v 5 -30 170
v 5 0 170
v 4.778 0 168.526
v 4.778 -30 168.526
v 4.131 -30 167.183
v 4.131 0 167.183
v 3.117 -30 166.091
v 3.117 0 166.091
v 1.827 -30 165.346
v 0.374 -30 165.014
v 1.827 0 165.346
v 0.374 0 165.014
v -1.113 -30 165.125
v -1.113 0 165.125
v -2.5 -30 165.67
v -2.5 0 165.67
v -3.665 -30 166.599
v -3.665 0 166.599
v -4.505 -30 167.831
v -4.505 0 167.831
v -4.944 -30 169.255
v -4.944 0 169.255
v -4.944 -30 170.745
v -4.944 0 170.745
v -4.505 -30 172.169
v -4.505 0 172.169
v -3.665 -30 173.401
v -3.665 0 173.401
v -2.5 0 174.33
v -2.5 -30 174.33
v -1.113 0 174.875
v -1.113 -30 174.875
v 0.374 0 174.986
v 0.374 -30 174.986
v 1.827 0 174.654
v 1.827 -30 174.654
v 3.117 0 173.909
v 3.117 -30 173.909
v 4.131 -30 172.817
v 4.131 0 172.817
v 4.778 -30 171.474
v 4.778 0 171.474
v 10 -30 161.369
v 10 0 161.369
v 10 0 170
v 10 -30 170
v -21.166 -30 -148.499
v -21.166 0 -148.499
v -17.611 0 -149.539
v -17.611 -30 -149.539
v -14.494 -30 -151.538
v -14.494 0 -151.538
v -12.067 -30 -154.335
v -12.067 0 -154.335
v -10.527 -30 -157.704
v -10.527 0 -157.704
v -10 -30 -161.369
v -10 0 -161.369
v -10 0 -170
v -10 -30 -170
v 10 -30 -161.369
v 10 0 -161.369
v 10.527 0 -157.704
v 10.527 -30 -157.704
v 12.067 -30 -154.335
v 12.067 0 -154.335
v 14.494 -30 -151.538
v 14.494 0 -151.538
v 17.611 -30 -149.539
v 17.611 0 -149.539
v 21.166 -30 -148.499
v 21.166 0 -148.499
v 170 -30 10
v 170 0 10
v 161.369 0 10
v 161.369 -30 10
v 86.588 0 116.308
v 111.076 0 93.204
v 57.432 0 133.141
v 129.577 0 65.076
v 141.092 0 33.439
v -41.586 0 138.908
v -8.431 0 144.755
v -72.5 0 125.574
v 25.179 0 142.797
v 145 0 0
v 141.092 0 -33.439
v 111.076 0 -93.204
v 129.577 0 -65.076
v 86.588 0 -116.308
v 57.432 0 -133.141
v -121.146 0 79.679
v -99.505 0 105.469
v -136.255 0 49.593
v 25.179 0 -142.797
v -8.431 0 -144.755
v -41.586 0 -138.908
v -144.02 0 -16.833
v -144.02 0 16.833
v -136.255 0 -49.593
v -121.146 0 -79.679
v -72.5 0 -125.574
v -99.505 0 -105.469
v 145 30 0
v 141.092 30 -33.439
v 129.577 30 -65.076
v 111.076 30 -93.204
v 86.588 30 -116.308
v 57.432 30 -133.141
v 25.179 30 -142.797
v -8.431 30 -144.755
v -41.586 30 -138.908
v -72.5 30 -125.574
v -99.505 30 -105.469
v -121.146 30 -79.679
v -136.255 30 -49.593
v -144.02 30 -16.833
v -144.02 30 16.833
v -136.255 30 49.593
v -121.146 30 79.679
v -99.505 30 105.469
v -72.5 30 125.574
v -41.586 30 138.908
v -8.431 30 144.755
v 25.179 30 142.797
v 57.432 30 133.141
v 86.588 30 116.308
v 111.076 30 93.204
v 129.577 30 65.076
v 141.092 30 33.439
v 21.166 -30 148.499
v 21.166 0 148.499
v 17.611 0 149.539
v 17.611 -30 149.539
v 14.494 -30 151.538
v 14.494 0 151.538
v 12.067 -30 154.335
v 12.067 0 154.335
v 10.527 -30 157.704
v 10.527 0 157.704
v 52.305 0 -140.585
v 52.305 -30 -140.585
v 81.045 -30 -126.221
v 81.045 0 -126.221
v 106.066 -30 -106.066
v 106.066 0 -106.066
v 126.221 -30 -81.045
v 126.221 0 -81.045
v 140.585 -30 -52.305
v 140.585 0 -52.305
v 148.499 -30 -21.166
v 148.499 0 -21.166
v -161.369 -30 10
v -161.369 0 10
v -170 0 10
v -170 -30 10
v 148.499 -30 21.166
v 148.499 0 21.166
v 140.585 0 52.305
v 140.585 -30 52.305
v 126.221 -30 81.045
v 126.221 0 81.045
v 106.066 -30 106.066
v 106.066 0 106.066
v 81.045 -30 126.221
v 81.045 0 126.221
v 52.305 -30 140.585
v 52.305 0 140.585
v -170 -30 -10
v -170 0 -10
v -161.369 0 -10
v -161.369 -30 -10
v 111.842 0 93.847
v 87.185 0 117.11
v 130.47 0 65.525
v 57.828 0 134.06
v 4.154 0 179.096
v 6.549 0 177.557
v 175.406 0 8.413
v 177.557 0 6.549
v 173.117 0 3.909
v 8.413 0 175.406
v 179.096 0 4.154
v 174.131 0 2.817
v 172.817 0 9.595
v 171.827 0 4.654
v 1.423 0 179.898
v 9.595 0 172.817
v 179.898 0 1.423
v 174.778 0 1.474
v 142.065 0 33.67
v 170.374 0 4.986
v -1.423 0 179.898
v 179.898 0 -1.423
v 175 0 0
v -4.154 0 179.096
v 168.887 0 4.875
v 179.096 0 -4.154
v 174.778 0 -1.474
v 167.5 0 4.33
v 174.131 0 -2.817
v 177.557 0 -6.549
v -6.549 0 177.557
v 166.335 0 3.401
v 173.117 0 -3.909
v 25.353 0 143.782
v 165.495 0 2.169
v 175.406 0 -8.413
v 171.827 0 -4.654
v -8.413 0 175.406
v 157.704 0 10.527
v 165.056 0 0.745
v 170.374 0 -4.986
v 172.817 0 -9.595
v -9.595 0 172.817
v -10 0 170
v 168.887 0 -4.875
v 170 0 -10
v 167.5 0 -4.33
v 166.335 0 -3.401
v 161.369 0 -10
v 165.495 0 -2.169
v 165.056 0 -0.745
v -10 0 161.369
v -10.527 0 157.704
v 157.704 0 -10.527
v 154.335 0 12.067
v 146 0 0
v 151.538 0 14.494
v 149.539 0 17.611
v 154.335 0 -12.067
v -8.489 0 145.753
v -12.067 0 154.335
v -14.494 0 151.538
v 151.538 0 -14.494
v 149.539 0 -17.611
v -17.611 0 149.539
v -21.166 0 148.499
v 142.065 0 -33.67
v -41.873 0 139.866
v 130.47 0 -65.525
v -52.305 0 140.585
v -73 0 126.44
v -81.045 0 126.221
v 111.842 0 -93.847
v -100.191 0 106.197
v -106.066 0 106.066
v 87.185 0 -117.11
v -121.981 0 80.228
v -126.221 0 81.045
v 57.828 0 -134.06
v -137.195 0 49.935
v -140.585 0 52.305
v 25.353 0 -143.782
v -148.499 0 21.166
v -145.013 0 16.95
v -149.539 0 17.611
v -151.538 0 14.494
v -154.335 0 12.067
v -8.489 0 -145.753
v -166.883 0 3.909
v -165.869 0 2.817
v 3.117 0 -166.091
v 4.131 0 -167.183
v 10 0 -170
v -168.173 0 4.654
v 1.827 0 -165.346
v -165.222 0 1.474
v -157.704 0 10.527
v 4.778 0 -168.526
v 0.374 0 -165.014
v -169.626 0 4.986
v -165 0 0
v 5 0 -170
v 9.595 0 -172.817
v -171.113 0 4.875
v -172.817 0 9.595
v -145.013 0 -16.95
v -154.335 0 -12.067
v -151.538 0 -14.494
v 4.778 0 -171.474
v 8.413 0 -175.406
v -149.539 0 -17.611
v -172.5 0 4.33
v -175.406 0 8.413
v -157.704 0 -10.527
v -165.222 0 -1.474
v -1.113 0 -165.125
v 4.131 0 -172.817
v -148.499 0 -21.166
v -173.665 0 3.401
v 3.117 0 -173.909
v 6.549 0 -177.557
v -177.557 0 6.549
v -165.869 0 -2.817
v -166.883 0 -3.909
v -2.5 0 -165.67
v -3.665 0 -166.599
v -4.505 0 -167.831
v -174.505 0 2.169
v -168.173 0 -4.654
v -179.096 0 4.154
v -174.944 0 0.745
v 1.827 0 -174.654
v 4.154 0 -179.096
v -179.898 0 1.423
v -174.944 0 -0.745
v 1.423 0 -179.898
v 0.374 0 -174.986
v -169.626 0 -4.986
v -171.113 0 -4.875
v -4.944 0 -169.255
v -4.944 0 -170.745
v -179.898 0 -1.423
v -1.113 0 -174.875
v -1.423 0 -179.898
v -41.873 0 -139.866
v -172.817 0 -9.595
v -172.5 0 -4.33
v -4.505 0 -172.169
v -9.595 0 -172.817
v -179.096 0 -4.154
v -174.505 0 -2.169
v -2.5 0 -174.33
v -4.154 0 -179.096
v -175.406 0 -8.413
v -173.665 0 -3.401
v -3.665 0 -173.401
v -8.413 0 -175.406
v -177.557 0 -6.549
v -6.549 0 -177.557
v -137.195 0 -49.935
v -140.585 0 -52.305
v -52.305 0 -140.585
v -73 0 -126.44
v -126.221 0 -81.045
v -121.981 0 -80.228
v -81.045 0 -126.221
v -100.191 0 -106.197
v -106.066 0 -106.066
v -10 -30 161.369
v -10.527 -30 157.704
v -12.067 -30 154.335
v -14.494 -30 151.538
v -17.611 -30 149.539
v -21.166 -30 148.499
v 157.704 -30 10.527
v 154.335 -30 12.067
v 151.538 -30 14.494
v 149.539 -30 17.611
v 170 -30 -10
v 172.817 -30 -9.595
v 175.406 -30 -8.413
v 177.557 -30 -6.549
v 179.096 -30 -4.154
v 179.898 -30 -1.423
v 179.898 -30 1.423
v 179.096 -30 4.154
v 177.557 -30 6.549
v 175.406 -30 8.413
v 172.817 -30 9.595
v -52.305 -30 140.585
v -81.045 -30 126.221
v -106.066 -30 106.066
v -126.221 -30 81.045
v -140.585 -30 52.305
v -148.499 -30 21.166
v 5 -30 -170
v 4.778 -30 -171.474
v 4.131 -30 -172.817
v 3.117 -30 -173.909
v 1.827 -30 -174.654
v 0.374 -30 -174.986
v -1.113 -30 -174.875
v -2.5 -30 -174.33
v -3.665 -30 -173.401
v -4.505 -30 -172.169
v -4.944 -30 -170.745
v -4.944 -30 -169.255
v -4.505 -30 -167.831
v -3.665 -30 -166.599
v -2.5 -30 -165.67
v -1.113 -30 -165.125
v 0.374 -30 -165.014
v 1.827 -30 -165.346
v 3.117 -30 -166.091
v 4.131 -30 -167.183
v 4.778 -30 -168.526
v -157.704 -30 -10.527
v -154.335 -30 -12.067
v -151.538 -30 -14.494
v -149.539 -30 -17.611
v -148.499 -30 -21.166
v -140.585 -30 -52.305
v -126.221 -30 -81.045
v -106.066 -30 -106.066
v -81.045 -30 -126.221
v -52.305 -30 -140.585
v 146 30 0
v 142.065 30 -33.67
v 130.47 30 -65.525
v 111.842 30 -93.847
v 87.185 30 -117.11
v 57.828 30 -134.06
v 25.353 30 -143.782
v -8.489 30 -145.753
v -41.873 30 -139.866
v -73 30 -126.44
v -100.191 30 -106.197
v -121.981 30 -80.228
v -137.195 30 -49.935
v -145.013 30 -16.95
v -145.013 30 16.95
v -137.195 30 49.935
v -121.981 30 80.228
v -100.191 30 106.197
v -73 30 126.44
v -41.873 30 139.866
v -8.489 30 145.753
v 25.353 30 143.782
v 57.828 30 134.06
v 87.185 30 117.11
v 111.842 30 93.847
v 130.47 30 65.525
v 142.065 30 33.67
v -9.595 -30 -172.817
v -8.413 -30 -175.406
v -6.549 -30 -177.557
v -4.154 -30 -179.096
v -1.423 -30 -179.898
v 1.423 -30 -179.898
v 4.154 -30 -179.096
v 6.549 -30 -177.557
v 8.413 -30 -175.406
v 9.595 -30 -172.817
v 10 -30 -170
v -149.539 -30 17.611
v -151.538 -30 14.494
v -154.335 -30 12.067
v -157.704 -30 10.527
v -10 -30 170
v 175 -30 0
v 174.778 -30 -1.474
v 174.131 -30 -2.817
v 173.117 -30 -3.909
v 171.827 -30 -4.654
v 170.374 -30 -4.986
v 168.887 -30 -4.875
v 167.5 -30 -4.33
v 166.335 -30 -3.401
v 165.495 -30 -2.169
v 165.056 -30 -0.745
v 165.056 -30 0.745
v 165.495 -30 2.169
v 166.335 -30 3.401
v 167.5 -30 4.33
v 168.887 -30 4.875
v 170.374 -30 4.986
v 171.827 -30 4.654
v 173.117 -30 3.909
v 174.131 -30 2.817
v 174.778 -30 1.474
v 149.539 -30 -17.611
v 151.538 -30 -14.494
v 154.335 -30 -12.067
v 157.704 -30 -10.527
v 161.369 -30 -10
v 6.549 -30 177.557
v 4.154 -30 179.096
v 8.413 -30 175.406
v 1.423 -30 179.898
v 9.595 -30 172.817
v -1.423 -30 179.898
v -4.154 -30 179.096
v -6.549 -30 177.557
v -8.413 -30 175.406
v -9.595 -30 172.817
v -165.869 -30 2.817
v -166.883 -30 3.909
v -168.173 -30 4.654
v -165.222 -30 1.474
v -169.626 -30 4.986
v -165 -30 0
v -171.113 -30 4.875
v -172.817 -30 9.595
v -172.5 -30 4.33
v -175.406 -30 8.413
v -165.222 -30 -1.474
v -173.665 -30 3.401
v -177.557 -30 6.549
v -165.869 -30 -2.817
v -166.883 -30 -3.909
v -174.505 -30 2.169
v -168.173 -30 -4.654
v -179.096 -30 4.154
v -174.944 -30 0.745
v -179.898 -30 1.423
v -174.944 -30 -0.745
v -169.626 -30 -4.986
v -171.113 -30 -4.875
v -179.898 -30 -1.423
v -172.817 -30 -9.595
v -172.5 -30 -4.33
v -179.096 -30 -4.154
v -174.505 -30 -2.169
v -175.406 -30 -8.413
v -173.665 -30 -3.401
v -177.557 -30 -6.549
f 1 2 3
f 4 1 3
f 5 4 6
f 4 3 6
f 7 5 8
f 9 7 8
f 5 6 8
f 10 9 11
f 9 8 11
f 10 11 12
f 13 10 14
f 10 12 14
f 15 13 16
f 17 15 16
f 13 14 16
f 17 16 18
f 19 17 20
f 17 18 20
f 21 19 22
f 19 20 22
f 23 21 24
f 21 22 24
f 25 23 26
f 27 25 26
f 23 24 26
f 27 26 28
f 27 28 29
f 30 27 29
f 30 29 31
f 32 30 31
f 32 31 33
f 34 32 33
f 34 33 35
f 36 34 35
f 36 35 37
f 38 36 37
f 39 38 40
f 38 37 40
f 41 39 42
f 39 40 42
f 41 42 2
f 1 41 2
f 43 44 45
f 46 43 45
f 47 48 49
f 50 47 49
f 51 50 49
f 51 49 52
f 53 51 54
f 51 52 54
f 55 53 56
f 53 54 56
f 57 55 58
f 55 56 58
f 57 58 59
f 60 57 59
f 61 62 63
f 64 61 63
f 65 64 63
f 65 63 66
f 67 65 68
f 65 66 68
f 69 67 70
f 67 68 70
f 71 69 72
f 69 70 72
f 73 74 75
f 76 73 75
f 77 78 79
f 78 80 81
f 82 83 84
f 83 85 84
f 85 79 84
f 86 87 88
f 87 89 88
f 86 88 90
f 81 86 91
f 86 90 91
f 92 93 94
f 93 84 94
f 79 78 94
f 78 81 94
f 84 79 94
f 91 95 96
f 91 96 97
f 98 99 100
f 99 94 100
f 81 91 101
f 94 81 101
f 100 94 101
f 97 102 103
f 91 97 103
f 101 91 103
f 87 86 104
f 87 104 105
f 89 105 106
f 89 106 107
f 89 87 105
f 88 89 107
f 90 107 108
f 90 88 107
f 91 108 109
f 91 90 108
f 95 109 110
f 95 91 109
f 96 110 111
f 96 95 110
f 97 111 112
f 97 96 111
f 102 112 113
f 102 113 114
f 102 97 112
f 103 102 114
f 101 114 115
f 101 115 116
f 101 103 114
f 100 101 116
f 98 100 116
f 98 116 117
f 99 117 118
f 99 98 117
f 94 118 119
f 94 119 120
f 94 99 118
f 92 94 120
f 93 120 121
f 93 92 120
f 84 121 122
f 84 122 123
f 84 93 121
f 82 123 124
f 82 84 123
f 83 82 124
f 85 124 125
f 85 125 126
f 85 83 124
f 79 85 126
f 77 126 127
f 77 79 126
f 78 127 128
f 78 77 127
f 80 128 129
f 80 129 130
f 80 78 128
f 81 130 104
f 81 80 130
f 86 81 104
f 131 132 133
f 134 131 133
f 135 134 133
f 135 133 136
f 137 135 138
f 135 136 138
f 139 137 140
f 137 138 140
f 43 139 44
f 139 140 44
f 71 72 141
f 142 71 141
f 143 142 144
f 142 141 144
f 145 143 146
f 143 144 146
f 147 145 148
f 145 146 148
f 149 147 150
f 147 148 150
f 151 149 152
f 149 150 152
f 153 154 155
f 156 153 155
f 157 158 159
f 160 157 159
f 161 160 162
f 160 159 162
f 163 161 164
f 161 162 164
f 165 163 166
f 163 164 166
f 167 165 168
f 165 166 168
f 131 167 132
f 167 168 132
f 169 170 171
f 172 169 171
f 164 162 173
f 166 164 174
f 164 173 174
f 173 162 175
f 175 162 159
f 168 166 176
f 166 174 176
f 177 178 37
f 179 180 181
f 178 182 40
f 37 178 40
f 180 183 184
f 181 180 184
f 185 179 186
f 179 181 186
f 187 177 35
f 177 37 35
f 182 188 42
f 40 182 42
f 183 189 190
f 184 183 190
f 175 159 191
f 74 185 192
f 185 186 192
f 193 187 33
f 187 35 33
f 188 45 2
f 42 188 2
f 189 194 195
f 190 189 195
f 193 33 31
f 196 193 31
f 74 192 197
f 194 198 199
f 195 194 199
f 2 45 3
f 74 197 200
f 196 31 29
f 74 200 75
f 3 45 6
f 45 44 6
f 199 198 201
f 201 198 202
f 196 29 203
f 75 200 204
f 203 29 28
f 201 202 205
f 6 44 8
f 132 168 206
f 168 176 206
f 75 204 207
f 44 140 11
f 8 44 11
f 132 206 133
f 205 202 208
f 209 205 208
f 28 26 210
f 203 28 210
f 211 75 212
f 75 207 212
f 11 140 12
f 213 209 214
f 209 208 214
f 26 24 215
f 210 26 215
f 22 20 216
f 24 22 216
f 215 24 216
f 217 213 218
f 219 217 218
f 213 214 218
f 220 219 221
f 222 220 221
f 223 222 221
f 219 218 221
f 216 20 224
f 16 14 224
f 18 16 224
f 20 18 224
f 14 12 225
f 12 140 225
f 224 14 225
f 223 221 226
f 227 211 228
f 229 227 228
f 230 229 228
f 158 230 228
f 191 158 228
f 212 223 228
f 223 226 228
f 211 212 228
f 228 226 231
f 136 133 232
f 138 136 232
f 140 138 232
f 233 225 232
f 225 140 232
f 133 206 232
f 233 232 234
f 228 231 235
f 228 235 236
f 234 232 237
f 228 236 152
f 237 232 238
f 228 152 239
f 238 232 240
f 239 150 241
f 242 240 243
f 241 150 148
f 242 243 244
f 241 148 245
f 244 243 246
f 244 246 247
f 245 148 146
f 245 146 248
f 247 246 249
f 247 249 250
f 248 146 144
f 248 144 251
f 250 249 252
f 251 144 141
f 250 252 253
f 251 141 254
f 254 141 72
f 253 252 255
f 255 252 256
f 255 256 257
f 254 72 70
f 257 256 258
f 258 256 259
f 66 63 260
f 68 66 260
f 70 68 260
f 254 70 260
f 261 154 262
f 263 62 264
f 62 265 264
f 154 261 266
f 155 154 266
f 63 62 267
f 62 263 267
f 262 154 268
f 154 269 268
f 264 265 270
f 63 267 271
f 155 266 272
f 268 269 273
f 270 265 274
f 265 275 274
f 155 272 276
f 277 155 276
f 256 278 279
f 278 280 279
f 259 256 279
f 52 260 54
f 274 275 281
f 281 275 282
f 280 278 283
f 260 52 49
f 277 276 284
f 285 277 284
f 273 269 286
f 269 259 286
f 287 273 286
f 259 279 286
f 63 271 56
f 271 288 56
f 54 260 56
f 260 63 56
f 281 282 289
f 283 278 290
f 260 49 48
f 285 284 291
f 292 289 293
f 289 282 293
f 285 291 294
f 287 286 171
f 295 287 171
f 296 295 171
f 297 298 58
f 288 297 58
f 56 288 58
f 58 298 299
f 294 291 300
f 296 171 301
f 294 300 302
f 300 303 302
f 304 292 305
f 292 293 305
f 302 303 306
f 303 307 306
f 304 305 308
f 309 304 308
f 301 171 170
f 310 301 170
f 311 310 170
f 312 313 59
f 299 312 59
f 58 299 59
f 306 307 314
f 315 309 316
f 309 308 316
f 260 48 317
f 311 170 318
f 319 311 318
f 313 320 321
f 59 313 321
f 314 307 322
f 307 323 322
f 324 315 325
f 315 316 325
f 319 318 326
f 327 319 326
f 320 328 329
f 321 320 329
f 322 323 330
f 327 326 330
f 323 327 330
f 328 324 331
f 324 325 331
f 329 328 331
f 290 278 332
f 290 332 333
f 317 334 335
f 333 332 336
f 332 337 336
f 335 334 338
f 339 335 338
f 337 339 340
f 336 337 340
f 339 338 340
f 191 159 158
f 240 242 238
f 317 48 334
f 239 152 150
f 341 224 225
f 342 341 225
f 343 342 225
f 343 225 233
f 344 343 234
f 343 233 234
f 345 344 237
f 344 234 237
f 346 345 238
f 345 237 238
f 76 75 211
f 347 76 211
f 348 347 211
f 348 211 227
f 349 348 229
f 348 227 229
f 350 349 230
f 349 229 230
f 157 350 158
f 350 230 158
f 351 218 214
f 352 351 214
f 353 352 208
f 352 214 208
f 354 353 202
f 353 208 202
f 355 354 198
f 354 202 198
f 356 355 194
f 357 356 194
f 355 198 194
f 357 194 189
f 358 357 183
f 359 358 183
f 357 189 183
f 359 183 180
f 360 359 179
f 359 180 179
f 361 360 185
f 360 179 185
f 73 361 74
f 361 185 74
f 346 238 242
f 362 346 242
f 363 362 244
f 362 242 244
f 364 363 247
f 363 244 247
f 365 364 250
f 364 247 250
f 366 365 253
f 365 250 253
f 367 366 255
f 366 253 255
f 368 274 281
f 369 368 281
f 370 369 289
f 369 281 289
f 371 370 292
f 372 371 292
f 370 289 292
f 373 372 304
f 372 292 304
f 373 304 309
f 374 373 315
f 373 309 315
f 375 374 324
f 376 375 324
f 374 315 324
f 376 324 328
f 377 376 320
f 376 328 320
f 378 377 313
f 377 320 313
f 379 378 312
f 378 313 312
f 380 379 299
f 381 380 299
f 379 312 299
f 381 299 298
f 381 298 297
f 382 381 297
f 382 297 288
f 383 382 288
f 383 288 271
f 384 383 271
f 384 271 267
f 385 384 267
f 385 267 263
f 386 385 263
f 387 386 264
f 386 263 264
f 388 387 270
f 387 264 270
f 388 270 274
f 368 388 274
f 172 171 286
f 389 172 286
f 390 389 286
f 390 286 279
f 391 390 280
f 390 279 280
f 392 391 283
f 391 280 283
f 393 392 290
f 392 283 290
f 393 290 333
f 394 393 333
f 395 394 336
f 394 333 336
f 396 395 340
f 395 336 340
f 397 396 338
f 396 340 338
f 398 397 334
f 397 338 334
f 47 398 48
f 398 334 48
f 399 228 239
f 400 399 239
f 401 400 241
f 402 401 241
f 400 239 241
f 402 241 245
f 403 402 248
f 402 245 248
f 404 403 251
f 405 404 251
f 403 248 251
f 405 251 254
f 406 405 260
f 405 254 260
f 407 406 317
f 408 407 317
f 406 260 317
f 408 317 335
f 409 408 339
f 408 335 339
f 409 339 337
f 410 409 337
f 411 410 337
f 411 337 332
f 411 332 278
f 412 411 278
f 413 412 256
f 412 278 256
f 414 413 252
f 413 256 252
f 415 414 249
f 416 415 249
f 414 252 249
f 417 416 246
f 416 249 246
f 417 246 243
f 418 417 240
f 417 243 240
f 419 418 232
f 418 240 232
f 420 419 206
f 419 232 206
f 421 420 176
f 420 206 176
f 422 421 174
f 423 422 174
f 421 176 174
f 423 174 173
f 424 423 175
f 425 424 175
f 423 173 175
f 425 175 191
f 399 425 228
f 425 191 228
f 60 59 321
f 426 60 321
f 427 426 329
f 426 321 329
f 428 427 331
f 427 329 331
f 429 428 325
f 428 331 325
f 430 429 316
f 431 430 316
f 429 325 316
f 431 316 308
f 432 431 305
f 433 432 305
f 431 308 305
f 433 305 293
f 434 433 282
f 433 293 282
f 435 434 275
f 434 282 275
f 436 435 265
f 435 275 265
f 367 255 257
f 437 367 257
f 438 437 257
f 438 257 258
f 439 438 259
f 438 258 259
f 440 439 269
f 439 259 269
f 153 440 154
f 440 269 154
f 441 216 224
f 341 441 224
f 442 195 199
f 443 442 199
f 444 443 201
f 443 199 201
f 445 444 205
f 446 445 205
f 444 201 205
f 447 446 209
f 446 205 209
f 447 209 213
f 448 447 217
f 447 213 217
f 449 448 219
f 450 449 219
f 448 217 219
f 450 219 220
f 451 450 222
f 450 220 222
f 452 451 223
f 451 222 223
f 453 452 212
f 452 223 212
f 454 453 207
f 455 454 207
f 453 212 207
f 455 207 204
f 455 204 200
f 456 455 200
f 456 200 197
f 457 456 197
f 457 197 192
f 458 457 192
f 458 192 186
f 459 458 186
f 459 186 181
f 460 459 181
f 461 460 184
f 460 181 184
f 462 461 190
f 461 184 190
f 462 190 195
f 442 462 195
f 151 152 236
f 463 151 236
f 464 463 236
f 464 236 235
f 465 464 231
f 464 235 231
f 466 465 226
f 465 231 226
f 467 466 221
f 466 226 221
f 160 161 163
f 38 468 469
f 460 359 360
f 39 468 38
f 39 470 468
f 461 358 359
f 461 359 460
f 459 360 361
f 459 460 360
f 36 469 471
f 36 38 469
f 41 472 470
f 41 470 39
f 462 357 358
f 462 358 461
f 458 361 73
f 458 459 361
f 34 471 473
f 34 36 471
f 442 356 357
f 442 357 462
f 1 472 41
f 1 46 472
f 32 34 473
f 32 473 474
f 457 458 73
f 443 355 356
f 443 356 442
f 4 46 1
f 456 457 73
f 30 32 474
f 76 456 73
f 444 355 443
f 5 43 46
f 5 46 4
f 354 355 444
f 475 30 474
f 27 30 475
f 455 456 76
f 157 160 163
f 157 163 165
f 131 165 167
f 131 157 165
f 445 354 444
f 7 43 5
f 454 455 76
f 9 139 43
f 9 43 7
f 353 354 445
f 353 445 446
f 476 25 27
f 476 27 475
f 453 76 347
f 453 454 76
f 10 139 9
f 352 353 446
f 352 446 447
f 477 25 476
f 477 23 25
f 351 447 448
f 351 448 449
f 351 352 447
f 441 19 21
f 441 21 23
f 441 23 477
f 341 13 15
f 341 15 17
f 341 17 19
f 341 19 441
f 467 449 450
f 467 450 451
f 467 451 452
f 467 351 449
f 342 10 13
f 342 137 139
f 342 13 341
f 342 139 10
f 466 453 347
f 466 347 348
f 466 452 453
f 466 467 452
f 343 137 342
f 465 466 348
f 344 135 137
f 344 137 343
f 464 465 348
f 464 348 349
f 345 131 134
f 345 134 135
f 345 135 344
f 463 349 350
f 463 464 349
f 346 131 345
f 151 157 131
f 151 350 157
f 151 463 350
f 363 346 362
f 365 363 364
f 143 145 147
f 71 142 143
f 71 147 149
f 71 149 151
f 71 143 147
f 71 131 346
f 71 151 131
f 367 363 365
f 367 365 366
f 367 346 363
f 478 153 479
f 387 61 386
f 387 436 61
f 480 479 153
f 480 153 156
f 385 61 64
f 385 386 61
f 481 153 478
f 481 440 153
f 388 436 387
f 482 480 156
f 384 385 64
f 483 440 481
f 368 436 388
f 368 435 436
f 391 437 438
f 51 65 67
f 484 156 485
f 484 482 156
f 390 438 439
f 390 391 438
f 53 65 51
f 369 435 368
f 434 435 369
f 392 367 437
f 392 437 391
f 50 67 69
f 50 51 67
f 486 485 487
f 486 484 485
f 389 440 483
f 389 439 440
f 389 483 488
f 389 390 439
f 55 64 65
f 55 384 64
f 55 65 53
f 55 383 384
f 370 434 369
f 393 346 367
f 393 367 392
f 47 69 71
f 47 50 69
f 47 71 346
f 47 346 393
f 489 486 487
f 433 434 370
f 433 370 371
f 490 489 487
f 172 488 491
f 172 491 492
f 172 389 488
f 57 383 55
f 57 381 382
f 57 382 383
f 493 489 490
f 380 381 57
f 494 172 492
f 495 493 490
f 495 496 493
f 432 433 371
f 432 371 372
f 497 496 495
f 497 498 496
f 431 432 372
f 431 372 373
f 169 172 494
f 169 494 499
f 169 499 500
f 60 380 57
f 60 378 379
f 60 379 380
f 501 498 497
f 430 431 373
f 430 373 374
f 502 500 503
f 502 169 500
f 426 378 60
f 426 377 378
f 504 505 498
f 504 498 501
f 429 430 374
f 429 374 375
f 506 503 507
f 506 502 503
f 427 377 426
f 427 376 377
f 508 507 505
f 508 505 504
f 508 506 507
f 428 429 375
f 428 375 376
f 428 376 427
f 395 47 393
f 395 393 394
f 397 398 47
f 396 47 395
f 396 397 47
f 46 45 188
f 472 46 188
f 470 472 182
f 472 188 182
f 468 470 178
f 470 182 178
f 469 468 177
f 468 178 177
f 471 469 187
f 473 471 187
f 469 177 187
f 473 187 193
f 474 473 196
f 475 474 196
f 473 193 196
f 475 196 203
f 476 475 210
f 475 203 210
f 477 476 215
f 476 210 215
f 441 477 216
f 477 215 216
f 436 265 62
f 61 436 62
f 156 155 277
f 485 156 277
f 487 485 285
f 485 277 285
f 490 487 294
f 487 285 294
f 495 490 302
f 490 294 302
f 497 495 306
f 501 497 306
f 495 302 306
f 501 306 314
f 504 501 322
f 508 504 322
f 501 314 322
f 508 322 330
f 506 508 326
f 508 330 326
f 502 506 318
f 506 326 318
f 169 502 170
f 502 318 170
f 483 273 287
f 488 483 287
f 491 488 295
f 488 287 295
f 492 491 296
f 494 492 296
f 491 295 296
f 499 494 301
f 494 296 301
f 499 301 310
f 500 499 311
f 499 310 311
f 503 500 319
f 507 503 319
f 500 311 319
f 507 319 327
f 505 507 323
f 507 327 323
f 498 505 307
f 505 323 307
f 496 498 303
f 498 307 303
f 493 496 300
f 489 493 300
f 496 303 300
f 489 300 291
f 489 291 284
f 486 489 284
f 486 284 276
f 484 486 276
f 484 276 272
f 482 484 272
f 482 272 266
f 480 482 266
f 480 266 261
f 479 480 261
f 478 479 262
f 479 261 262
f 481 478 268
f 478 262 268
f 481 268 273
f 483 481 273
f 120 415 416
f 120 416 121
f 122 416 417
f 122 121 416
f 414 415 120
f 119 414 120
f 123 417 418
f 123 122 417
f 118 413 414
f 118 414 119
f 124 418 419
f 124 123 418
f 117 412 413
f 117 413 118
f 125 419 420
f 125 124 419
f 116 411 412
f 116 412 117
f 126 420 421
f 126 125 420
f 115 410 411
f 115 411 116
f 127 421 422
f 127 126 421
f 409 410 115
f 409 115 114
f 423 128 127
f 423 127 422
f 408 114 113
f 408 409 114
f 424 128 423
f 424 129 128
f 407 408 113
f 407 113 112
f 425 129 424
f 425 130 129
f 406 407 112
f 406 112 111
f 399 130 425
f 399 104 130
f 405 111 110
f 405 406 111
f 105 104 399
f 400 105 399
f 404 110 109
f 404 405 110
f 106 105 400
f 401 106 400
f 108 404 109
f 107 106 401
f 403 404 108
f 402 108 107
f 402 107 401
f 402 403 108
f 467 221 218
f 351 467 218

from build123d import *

# Parameters (mm, degrees)
SKETCH2_R           = 146
SKETCH2_R_2         = 145
BOSS_EXTRUDE2_DEPTH = 30
SKETCH3_R           = 5
BOSS_EXTRUDE4_DEPTH = 30


with BuildPart() as part:
    # Sketch2 → Boss-Extrude2 (new body)
    with BuildSketch(Plane(origin=(0, 0, 0), x_dir=(1, 0, 0), z_dir=(0, 1, 0))):
        Circle(SKETCH2_R)
        Circle(SKETCH2_R_2, mode=Mode.SUBTRACT)
    extrude(amount=BOSS_EXTRUDE2_DEPTH)

    # Sketch3 → Boss-Extrude4 (add)
    with BuildSketch(Plane(origin=(0, 0, 0), x_dir=(1, 0, 0), z_dir=(0, 1, 0))):
        with BuildLine():
            Line((161.369142032, 10), (170, 10))
            ThreePointArc((170, 10), (180, 0), (170, -10))
            Line((170, -10), (161.369142032, -10))
            ThreePointArc((161.369142032, -10), (152.849946816, -13.180462695), (148.499210458, -21.165644172))
            ThreePointArc((148.499210458, -21.165644172), (106.066017178, -106.066017178), (21.165644172, -148.499210458))
            ThreePointArc((21.165644172, -148.499210458), (13.180462695, -152.849946816), (10, -161.369142032))
            Line((10, -161.369142032), (10, -170))
            ThreePointArc((10, -170), (0, -180), (-10, -170))
            Line((-10, -170), (-10, -161.369142032))
            ThreePointArc((-10, -161.369142032), (-13.180462695, -152.849946816), (-21.165644172, -148.499210458))
            ThreePointArc((-21.165644172, -148.499210458), (-106.066017178, -106.066017178), (-148.499210458, -21.165644172))
            ThreePointArc((-148.499210458, -21.165644172), (-152.849946816, -13.180462695), (-161.369142032, -10))
            Line((-161.369142032, -10), (-170, -10))
            ThreePointArc((-170, -10), (-180, 0), (-170, 10))
            Line((-170, 10), (-161.369142032, 10))
            ThreePointArc((-161.369142032, 10), (-152.849946816, 13.180462695), (-148.499210458, 21.165644172))
            ThreePointArc((-148.499210458, 21.165644172), (-106.066017178, 106.066017178), (-21.165644172, 148.499210458))
            ThreePointArc((-21.165644172, 148.499210458), (-13.180462695, 152.849946816), (-10, 161.369142032))
            Line((-10, 161.369142032), (-10, 170))
            ThreePointArc((-10, 170), (0, 180), (10, 170))
            Line((10, 170), (10, 161.369142032))
            ThreePointArc((10, 161.369142032), (13.180462695, 152.849946816), (21.165644172, 148.499210458))
            ThreePointArc((21.165644172, 148.499210458), (106.066017178, 106.066017178), (148.499210458, 21.165644172))
            ThreePointArc((148.499210458, 21.165644172), (152.849946816, 13.180462695), (161.369142032, 10))
        make_face()
        with Locations((0, 170)):
            Circle(SKETCH3_R, mode=Mode.SUBTRACT)
        with Locations((170, 0)):
            Circle(SKETCH3_R, mode=Mode.SUBTRACT)
        with Locations((0, -170)):
            Circle(SKETCH3_R, mode=Mode.SUBTRACT)
        with Locations((-170, 0)):
            Circle(SKETCH3_R, mode=Mode.SUBTRACT)
    extrude(amount=-BOSS_EXTRUDE4_DEPTH)


solid = part.part
